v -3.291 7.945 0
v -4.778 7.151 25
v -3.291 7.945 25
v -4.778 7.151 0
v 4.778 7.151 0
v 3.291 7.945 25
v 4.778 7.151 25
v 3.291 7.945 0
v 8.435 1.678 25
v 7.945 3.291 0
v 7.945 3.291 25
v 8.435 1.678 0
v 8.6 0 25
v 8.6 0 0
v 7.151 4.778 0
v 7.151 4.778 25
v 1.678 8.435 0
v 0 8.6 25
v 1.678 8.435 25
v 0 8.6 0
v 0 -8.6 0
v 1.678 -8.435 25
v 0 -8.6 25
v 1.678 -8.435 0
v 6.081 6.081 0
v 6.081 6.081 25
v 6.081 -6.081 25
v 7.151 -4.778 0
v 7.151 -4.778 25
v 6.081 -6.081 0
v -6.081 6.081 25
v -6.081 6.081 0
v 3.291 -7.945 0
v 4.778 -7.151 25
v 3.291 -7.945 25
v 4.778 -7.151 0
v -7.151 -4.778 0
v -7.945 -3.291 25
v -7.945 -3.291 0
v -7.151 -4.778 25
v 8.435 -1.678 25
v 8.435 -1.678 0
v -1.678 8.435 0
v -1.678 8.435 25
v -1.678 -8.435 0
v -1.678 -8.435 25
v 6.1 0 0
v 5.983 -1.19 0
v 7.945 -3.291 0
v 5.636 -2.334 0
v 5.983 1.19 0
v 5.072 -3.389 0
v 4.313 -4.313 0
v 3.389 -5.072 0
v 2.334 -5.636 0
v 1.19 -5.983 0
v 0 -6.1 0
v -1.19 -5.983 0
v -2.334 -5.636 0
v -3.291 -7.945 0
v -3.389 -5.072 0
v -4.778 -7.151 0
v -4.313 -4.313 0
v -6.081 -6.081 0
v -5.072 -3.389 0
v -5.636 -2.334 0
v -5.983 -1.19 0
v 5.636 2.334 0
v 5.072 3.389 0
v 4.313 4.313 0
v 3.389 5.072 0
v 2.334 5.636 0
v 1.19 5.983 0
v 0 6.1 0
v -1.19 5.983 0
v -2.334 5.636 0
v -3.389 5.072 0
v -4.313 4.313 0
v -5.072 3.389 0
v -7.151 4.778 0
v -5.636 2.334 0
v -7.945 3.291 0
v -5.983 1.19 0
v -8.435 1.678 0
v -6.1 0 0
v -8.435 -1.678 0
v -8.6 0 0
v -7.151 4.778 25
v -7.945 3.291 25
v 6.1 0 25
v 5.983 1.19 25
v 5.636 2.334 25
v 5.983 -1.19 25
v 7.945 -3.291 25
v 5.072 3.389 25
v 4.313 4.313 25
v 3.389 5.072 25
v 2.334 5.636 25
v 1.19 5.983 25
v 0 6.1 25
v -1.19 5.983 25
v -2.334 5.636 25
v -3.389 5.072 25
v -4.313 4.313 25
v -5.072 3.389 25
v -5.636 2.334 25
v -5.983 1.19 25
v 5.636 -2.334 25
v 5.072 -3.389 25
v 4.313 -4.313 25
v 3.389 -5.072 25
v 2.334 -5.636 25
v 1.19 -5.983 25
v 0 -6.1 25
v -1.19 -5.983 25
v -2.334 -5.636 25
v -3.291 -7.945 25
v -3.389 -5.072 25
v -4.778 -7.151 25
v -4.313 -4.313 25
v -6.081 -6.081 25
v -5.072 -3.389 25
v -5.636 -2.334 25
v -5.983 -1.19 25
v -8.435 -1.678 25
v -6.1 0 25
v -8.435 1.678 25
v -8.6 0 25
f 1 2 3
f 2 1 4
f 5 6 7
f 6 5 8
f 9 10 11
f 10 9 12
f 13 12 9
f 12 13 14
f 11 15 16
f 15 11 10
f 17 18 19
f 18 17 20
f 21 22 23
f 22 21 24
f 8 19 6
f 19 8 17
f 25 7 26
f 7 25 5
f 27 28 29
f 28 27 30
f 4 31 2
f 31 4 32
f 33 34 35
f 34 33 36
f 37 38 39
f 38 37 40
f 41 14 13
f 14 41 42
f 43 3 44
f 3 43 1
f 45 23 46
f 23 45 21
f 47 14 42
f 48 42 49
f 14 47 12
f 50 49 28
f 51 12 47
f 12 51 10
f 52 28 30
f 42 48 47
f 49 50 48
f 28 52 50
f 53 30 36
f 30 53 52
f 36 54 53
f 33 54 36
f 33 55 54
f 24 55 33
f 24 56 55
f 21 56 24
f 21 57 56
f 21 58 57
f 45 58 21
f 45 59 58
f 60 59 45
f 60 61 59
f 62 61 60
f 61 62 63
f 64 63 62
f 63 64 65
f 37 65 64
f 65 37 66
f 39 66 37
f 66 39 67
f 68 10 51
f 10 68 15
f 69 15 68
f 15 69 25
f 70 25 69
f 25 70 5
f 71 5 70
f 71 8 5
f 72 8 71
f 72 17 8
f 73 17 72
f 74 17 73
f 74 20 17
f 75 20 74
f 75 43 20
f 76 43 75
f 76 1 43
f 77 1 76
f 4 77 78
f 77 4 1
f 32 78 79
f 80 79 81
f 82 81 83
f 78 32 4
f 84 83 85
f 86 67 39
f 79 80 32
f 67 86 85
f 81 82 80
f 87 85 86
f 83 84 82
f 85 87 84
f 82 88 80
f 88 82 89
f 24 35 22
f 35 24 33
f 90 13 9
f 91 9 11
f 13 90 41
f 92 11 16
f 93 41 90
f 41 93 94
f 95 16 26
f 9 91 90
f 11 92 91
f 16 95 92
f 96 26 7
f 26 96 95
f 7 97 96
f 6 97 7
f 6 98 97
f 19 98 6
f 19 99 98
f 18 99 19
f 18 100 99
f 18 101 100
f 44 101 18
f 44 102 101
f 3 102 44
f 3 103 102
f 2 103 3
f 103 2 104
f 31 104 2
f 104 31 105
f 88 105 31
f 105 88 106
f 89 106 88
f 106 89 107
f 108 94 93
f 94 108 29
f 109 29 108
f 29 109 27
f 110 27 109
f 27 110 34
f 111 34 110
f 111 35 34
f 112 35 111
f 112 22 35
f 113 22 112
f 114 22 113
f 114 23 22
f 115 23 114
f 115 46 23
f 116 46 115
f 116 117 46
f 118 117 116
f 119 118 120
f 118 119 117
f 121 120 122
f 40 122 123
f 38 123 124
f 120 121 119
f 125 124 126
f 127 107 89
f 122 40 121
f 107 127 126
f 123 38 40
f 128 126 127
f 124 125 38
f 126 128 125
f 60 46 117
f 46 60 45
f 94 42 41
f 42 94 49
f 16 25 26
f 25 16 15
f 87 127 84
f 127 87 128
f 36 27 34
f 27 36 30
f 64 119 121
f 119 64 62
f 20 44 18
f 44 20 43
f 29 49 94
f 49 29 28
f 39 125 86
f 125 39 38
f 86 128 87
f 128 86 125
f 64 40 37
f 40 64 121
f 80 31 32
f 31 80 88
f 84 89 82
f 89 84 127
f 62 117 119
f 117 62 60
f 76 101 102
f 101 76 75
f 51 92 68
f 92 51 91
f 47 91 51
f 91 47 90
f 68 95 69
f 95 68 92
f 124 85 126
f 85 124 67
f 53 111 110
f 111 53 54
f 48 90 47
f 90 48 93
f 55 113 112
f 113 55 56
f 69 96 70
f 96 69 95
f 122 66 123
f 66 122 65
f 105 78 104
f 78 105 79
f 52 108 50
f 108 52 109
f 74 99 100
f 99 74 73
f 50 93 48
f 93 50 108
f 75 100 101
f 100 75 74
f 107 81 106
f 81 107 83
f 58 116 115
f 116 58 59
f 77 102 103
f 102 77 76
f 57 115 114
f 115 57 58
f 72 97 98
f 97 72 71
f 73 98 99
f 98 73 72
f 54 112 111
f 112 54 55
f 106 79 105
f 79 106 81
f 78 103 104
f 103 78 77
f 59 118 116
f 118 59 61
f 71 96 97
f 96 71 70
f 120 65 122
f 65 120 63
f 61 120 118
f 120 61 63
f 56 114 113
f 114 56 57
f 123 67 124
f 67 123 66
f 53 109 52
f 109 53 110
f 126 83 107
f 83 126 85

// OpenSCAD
$fn = 32;

// ----------------------------------------------------------------------
// Spacer sleeve: 17.2 / 12.2 x 25 mm
// ----------------------------------------------------------------------

// --- parameters (mm) ---
outer_d = 17.2;           // outside diameter
inner_d = 12.2;           // shaft bore
length = 25;              // sleeve length

module sleeve() {
  cylinder(h = length, d = outer_d);
}

difference() {
  sleeve();
  translate([0, 0, -1]) cylinder(h = length + 2, d = inner_d);
}
